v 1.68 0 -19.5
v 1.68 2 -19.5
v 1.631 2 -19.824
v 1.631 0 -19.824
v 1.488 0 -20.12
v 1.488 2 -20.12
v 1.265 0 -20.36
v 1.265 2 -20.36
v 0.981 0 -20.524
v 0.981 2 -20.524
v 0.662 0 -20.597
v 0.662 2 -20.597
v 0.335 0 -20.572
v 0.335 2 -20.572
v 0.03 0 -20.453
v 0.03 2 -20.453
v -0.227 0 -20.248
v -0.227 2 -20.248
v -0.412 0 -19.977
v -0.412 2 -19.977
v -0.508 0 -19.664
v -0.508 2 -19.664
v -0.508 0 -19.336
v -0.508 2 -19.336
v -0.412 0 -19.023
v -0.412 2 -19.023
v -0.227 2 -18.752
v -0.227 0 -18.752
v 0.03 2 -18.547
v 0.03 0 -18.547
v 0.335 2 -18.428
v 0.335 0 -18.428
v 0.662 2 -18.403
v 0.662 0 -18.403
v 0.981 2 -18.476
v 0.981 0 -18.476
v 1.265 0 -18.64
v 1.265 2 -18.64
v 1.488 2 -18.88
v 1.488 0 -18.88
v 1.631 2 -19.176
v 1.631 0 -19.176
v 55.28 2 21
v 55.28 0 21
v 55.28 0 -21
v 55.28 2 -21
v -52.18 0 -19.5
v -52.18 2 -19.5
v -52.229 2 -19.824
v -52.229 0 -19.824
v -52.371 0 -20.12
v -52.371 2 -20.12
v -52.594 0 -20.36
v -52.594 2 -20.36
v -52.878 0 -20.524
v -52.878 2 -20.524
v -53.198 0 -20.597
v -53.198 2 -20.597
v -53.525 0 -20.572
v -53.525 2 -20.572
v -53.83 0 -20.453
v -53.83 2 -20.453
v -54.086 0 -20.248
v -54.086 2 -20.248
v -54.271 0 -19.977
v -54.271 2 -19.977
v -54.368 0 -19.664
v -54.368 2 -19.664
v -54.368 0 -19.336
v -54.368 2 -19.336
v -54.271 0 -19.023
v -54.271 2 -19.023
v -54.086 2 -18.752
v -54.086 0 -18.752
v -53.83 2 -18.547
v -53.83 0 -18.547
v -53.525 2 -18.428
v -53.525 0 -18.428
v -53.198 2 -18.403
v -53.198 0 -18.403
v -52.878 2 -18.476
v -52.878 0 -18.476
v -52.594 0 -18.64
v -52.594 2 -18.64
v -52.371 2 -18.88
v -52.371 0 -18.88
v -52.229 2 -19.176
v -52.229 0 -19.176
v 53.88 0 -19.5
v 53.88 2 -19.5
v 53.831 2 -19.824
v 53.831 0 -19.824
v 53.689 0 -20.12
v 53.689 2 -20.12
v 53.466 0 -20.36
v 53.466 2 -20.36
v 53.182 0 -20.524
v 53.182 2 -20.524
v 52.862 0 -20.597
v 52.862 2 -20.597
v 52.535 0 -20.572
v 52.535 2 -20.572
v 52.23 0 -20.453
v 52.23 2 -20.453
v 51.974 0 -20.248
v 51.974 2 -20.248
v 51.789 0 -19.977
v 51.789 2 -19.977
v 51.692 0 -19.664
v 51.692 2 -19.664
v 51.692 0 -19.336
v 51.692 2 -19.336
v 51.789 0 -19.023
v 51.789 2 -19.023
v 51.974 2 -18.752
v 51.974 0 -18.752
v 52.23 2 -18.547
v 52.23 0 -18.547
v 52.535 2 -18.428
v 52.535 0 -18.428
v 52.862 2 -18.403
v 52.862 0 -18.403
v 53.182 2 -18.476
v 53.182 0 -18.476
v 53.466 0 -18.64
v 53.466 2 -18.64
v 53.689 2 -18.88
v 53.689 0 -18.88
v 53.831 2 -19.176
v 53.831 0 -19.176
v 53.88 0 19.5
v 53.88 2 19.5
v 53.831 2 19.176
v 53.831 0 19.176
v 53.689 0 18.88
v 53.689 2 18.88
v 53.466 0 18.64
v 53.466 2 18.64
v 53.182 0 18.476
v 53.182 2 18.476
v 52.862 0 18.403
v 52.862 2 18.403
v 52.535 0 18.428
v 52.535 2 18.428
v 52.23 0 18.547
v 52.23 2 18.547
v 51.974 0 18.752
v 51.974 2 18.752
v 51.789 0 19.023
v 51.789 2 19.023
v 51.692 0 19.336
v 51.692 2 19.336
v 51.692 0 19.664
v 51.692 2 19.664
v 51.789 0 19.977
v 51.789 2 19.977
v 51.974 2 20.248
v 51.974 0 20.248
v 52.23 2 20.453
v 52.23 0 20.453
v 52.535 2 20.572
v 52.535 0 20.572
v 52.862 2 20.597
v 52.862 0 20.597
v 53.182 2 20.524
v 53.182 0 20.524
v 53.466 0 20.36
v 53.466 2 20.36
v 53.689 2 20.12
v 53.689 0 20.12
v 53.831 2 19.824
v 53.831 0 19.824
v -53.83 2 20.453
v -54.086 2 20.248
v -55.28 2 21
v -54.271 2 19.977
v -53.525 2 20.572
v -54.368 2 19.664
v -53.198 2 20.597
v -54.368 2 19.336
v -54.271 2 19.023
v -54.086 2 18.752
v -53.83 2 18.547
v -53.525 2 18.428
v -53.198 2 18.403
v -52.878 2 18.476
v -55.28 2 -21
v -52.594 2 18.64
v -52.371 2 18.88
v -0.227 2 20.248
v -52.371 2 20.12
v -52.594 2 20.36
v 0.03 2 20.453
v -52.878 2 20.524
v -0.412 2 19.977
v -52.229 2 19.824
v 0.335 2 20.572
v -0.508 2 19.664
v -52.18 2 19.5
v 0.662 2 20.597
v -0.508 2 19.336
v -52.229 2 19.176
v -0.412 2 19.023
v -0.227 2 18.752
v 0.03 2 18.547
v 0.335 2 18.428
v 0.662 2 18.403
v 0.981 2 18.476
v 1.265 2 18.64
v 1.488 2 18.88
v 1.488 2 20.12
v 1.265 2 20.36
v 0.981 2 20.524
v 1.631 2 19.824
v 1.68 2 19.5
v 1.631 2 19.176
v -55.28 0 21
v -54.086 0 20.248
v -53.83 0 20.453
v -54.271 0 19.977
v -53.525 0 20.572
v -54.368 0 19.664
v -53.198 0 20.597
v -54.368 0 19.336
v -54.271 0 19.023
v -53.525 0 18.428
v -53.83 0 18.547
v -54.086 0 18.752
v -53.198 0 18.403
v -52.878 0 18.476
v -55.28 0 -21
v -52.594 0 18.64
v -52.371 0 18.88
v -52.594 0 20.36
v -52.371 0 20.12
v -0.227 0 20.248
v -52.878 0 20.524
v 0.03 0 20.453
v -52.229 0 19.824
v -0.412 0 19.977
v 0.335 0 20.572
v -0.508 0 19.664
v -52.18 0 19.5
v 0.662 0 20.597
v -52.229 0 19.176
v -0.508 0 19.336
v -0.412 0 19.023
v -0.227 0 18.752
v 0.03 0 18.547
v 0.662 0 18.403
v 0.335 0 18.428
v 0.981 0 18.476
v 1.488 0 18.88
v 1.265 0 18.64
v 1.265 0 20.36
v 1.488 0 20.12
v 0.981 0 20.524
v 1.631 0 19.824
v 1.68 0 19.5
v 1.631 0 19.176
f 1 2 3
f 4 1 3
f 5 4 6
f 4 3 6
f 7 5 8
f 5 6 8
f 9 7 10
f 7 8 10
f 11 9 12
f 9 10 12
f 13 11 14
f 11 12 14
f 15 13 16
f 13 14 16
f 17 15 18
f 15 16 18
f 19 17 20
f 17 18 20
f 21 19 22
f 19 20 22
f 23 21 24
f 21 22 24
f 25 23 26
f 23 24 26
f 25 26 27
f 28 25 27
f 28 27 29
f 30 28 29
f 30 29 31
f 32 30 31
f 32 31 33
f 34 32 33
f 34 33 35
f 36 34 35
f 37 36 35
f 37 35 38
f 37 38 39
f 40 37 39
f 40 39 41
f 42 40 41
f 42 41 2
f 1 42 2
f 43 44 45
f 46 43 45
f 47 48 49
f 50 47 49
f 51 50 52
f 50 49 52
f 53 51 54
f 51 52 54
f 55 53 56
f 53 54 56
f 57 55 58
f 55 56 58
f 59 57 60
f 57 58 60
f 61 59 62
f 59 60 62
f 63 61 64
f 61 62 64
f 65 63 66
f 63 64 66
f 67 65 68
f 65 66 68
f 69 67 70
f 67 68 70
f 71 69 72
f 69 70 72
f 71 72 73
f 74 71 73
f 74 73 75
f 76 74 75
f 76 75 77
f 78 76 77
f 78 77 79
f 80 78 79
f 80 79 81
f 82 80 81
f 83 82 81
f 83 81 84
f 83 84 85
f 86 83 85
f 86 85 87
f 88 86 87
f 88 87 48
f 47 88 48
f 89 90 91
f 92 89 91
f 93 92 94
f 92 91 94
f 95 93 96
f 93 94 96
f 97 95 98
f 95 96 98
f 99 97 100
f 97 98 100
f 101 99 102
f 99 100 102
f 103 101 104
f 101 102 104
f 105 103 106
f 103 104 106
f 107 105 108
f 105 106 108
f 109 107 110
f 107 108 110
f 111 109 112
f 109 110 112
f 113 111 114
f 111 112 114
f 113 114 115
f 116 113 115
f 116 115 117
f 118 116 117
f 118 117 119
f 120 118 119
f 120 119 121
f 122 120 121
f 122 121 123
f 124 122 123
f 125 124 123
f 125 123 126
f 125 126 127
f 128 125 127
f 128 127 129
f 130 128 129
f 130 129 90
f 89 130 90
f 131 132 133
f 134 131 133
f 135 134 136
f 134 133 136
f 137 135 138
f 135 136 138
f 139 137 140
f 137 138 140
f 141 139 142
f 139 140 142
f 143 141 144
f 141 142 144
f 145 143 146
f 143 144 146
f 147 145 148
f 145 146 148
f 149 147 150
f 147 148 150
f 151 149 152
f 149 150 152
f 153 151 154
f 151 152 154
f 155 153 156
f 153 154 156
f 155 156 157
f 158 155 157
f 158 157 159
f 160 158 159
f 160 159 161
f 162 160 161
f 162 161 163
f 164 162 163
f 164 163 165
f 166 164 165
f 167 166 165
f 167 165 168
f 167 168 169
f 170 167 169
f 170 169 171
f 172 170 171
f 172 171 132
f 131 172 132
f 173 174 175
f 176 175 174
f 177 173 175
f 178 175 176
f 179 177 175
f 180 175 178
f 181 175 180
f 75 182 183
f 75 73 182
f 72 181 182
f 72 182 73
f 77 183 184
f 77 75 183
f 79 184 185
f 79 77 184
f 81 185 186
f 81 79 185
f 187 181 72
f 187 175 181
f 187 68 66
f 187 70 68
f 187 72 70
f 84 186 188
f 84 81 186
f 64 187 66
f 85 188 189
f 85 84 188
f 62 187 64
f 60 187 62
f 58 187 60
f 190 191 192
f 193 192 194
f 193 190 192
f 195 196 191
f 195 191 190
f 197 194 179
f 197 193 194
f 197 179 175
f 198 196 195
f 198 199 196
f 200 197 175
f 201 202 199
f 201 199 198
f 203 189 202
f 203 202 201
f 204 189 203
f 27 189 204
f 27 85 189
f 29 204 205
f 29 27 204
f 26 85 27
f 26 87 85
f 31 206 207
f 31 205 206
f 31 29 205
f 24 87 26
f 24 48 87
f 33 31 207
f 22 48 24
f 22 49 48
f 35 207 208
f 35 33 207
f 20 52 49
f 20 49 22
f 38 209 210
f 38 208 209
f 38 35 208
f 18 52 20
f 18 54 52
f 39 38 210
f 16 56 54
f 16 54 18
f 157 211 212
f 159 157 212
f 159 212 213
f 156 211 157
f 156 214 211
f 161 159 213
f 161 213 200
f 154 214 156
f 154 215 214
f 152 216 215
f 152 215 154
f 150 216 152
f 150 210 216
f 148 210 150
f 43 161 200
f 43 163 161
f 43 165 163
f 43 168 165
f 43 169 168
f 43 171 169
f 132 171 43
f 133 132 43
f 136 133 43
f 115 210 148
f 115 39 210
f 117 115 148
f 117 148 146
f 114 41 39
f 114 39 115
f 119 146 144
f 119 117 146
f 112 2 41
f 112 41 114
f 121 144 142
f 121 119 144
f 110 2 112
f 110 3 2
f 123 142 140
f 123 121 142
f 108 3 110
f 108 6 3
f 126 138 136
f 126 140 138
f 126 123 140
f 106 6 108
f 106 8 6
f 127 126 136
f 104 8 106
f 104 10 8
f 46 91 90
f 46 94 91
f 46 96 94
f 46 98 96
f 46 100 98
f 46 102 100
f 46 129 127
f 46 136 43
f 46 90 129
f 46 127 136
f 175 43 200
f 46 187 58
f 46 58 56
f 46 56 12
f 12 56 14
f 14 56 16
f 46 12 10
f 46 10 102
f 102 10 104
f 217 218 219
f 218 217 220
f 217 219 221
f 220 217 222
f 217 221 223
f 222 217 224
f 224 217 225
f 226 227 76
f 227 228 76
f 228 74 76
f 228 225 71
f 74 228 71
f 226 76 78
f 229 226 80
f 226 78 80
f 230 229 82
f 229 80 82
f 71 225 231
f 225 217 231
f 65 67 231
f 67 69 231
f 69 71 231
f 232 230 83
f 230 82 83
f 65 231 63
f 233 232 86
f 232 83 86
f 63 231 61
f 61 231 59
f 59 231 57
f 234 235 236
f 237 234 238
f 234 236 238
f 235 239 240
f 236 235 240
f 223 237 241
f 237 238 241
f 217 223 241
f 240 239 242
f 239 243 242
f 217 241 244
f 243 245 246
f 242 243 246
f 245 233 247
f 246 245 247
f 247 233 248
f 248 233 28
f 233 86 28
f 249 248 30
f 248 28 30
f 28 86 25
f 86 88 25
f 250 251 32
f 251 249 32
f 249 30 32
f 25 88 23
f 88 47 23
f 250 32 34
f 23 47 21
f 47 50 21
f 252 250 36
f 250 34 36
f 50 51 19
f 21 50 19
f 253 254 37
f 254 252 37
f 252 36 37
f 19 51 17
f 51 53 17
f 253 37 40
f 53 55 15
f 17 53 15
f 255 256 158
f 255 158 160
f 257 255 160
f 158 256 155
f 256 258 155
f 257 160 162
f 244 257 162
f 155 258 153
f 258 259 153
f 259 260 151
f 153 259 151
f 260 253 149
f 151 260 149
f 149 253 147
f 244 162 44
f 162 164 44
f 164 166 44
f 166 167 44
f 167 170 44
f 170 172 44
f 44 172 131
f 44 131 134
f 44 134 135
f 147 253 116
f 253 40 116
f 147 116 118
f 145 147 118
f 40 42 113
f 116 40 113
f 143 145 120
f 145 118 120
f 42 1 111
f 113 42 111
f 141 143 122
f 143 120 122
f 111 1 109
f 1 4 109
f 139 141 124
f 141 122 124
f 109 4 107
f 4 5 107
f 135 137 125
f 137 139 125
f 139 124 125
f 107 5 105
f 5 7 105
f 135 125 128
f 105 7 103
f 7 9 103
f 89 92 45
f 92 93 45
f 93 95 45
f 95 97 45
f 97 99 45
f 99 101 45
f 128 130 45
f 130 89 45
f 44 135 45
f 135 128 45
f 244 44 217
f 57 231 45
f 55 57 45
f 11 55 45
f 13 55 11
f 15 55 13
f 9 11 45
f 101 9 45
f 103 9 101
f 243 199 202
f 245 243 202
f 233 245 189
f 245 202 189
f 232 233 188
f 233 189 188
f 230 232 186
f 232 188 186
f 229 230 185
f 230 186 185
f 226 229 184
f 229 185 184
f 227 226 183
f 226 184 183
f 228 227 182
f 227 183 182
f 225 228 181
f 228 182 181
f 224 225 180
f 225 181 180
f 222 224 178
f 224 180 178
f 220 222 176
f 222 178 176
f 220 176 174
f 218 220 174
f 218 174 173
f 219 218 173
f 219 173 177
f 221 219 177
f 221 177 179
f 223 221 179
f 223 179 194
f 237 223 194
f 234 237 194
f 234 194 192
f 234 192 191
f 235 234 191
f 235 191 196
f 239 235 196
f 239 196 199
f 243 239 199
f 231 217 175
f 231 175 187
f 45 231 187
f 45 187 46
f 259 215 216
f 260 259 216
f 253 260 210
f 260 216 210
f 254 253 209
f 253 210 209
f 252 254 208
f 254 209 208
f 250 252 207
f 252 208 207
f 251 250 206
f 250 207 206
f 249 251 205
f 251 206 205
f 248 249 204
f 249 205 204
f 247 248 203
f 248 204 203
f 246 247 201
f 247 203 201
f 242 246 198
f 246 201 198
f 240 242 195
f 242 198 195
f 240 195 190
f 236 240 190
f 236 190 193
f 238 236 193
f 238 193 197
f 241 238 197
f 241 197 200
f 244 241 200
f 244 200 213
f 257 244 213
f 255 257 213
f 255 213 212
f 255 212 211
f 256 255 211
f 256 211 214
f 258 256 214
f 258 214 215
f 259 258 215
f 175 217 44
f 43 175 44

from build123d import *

# Parameters (mm, degrees)
SKETCH1_W                      = 110.56
SKETCH1_H                      = 42
BOSS_EXTRUDE1_DEPTH            = 2
F_2_2_2_2_DIAMETER_HOLE1_D     = 2.2
F_2_2_2_2_DIAMETER_HOLE1_DEPTH = 2


with BuildPart() as part:
    # Sketch1 → Boss-Extrude1 (new body)
    with BuildSketch(Plane(origin=(0, 0, 0), x_dir=(1, 0, 0), z_dir=(0, 1, 0))):
        Rectangle(SKETCH1_W, SKETCH1_H)
    extrude(amount=BOSS_EXTRUDE1_DEPTH)

    # Ø2.2 (2.2) Diameter Hole1
    with Locations(Plane(origin=(0, 0, 0), x_dir=(-1, 0, 0), z_dir=(0, -1, 0))):
        with Locations((53.28, -19.5), (53.28, 19.5), (-52.78, 19.5), (-0.579521869, 19.5), (-0.579521869, -19.5), (-52.78, -19.5)):
            Hole(F_2_2_2_2_DIAMETER_HOLE1_D / 2, depth=F_2_2_2_2_DIAMETER_HOLE1_DEPTH)


solid = part.part
